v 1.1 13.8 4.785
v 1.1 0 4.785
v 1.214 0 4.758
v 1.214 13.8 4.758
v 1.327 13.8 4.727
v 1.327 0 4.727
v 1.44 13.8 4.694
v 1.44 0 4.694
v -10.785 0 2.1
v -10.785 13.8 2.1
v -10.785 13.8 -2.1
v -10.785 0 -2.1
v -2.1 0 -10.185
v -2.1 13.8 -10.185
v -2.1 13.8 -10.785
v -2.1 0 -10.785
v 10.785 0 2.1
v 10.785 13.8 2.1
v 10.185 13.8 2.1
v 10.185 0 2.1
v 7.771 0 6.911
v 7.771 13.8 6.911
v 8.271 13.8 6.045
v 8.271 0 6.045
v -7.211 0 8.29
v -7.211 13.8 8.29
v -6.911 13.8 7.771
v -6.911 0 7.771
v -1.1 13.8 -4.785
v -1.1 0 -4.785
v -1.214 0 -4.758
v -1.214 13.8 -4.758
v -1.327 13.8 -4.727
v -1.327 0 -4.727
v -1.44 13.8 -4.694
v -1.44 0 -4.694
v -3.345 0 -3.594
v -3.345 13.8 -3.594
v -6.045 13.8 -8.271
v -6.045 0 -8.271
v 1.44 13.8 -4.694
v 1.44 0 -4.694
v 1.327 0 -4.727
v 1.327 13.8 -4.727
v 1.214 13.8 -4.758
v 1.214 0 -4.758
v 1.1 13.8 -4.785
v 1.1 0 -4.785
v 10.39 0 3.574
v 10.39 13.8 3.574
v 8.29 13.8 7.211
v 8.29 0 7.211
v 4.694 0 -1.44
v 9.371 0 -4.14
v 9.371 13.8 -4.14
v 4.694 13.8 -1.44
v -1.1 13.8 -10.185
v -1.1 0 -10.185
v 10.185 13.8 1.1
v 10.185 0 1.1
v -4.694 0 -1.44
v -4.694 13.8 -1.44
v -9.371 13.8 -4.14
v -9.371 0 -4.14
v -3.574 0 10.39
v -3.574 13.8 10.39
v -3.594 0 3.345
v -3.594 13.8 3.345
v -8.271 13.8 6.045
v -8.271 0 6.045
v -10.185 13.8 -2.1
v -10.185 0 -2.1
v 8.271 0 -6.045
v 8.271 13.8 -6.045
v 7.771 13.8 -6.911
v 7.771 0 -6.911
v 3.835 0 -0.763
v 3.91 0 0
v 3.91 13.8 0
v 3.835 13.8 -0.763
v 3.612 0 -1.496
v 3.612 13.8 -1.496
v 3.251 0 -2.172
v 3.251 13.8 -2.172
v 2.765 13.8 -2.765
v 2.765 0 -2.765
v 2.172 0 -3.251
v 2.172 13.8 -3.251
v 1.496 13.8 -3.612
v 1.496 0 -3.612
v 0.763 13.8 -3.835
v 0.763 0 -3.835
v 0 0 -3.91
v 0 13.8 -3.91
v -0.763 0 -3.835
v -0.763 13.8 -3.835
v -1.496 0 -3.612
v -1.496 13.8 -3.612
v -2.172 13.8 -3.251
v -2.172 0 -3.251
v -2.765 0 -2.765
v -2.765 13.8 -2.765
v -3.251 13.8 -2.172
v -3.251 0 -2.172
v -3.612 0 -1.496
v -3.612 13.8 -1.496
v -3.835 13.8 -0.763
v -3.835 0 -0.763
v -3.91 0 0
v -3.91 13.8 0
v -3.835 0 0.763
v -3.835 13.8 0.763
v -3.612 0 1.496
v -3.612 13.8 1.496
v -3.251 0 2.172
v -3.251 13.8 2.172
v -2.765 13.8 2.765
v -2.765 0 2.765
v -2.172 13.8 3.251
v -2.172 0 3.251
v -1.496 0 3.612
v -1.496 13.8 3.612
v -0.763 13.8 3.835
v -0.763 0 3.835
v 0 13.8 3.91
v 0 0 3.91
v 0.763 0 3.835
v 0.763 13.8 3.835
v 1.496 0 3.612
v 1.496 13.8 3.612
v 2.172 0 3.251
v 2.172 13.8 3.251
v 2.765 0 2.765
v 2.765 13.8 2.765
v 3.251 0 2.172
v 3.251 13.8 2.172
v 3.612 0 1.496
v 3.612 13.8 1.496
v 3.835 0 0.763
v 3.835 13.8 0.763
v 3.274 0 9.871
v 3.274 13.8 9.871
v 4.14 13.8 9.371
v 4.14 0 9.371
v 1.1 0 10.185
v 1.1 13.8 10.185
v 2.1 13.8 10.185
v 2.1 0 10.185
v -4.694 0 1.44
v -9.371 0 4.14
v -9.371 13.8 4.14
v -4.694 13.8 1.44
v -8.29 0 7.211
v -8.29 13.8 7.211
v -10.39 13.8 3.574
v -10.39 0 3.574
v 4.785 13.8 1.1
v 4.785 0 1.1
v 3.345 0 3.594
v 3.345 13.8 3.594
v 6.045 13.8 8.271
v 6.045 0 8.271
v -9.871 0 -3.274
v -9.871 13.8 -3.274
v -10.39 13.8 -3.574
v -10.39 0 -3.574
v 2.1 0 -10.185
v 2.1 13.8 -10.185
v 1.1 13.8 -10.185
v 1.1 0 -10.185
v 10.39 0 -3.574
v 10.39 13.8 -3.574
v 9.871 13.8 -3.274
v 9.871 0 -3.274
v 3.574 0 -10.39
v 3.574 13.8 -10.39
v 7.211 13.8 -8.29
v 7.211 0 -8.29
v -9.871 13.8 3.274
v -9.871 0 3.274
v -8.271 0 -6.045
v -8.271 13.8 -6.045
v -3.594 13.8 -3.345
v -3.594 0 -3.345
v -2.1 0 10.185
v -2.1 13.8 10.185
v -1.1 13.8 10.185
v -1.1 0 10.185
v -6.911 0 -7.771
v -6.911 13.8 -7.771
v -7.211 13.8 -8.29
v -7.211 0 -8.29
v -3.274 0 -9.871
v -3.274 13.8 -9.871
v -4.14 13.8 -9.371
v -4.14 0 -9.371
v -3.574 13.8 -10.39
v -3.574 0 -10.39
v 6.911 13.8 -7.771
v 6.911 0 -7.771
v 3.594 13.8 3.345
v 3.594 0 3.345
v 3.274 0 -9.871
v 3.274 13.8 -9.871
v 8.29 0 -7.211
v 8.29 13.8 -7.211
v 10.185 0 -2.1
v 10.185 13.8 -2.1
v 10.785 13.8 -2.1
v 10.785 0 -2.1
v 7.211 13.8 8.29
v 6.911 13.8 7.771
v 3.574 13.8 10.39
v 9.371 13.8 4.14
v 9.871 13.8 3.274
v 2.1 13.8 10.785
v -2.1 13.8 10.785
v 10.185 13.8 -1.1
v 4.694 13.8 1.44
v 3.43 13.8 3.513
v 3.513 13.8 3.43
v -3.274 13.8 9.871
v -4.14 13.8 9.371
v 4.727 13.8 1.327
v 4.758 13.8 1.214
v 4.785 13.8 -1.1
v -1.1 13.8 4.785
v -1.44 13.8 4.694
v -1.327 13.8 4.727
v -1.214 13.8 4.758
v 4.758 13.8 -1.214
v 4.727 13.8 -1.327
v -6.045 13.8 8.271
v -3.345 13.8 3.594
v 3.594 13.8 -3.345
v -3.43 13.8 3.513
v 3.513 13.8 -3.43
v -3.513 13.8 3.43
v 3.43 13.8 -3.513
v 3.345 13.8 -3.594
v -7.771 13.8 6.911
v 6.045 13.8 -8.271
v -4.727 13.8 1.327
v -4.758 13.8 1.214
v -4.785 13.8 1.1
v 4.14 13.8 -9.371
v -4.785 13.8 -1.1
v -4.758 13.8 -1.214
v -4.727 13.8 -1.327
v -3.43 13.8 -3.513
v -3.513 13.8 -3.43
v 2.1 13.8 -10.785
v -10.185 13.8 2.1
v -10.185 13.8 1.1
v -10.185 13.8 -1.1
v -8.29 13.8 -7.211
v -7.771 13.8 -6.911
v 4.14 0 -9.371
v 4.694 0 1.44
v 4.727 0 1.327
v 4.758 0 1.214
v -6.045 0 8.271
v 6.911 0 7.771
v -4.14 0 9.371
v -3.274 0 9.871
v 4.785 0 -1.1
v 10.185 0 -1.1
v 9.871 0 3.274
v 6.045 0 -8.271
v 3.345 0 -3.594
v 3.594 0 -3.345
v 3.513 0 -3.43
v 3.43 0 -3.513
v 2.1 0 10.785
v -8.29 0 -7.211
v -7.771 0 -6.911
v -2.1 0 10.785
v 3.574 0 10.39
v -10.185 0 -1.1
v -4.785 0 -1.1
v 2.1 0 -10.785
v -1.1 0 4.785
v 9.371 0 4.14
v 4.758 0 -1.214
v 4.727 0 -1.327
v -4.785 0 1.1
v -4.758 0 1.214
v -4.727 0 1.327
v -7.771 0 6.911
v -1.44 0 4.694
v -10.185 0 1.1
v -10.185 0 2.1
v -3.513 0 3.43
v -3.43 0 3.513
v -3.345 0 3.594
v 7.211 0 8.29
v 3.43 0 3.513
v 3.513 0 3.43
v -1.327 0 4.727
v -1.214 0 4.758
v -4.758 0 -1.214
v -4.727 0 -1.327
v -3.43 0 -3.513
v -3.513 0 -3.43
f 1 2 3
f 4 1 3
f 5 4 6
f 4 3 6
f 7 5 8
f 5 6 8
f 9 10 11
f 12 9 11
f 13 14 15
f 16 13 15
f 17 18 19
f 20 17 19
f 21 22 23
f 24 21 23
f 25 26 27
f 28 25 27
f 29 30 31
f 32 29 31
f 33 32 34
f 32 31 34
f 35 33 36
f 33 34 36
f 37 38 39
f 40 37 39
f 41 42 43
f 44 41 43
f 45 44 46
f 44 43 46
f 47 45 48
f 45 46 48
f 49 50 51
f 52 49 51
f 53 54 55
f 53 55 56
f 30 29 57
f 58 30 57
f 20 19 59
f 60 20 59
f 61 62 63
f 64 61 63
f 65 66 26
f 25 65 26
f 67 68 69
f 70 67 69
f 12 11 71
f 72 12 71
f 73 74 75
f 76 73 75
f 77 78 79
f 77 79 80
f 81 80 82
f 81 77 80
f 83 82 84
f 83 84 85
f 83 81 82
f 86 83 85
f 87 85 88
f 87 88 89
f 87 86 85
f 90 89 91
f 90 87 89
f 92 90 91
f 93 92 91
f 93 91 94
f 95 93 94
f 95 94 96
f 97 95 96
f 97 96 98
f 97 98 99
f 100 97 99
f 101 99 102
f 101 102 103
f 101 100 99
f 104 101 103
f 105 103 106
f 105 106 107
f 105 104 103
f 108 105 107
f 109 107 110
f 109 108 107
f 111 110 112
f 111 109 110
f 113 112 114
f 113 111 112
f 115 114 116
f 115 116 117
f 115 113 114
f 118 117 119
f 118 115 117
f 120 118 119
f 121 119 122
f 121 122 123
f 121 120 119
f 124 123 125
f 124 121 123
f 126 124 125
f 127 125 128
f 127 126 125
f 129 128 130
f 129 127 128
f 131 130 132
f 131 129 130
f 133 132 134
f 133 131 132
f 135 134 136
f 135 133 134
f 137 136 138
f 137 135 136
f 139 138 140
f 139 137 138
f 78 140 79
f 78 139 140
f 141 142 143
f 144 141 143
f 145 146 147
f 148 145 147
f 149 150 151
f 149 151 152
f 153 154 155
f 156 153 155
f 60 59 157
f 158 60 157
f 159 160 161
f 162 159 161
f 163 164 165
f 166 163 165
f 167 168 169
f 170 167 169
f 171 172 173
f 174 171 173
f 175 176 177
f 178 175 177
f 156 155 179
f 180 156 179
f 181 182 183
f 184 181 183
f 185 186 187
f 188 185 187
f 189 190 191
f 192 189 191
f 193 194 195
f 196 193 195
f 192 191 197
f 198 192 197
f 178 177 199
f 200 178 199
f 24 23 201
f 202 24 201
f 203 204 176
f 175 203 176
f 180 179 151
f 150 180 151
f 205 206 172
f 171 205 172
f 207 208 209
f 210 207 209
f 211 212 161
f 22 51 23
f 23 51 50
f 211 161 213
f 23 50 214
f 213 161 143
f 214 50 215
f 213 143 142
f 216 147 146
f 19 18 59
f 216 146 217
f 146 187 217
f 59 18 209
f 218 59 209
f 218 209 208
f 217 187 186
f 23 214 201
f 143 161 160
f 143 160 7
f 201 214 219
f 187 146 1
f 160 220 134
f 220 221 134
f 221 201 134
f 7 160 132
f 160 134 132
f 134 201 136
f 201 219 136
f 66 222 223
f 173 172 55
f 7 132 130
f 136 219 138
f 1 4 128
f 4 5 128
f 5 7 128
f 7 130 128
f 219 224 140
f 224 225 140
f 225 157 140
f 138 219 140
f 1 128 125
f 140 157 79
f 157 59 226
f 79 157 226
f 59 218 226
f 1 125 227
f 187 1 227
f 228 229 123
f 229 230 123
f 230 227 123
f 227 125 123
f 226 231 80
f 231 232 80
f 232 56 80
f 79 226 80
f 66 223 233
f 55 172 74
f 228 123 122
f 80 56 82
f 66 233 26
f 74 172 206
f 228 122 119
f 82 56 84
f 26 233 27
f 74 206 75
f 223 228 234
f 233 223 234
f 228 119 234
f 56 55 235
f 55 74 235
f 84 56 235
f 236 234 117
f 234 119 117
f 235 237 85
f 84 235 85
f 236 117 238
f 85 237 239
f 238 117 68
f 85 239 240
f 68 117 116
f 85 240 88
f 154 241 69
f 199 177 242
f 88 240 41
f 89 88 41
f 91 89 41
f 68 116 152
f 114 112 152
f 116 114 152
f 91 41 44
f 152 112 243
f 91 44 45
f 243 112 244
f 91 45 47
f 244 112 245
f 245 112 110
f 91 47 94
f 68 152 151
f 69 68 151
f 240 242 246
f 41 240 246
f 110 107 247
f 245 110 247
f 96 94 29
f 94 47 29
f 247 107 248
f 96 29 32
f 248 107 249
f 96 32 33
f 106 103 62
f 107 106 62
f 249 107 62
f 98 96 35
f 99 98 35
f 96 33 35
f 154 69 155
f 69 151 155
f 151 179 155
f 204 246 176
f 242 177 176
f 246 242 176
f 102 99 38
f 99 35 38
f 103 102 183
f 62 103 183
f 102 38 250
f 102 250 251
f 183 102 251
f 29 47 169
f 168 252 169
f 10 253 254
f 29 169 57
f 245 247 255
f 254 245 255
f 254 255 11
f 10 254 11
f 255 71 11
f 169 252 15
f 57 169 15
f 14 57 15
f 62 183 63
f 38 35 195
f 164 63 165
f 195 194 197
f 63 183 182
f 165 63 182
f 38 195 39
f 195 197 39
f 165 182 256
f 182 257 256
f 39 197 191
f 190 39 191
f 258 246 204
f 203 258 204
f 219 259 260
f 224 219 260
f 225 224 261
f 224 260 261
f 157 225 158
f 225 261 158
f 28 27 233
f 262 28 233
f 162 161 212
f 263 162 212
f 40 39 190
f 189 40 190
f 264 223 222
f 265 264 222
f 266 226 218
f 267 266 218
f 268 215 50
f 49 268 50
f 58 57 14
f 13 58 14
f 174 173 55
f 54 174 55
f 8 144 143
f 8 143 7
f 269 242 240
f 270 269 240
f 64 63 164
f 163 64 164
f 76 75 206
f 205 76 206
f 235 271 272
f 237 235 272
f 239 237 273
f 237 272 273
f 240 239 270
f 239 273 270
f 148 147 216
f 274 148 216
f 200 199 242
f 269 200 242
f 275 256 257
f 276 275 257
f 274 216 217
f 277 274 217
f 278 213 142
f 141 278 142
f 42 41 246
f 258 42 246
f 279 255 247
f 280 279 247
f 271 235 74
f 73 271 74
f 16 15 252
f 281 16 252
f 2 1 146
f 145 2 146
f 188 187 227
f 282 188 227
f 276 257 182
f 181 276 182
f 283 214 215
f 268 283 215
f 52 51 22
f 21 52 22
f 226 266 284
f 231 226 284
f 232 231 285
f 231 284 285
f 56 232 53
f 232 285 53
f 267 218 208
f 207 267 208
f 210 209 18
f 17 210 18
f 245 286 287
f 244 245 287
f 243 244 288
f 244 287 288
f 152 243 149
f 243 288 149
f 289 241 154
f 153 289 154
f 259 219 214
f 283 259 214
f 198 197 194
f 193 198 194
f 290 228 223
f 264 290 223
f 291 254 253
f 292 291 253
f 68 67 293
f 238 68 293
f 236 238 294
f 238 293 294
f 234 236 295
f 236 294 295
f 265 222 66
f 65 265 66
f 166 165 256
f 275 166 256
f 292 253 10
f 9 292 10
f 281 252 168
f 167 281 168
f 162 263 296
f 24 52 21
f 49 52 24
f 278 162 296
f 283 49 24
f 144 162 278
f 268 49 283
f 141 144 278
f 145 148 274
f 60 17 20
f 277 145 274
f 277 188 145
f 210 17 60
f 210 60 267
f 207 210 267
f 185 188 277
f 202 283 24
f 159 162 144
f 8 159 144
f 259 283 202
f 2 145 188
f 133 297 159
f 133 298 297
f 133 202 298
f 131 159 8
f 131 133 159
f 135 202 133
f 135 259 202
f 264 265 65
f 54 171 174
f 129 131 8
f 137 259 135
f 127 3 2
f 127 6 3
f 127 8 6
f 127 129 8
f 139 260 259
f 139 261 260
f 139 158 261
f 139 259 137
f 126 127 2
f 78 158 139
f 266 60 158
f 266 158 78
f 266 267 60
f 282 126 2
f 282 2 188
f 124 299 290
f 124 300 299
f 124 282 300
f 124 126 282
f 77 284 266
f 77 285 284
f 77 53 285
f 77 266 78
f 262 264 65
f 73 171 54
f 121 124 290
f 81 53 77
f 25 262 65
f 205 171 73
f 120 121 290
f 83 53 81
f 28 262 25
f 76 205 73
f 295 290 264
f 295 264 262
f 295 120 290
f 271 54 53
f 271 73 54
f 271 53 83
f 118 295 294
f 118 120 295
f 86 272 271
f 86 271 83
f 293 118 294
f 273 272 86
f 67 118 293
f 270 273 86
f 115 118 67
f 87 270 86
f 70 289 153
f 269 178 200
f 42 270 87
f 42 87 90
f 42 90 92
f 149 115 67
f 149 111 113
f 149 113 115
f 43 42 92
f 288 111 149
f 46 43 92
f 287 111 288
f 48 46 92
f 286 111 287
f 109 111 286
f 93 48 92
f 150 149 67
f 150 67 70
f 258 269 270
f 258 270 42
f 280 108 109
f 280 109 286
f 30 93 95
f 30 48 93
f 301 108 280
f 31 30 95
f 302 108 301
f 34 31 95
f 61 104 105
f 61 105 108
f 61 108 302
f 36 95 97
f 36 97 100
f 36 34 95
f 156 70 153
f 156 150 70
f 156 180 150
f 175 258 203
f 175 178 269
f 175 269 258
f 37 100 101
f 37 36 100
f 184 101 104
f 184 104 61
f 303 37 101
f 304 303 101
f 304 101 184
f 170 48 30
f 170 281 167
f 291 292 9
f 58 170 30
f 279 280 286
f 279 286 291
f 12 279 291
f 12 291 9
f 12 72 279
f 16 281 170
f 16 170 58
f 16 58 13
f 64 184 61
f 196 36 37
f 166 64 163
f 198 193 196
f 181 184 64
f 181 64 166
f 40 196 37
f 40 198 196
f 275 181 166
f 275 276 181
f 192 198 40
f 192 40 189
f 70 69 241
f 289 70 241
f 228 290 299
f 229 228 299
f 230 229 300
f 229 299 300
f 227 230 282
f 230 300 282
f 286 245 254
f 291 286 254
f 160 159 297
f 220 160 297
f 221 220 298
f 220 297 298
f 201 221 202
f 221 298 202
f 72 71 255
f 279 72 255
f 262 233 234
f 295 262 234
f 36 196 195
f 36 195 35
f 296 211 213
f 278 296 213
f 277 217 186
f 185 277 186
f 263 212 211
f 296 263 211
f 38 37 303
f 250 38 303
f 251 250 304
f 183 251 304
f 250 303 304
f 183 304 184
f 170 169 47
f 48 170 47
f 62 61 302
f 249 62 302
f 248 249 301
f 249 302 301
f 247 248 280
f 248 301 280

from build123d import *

# Parameters (mm, degrees)
SKETCH2_R           = 4.91
SKETCH2_R_2         = 3.91
BOSS_EXTRUDE1_DEPTH = 13.8
BOSS_EXTRUDE2_DEPTH = 13.8


with BuildPart() as part:
    # Sketch2 → Boss-Extrude1 (new body)
    with BuildSketch(Plane(origin=(0, 0, 0), x_dir=(1, 0, 0), z_dir=(0, 1, 0))):
        Circle(SKETCH2_R)
        Circle(SKETCH2_R_2, mode=Mode.SUBTRACT)
    extrude(amount=BOSS_EXTRUDE1_DEPTH)

    # Sketch3 → Boss-Extrude2 (add)
    with BuildSketch(Plane(origin=(0, 13.8, 0), x_dir=(1, 0, 0), z_dir=(0, 1, 0))):
        with BuildLine():
            Line((4.785195921, 1.1), (10.185195921, 1.1))
            Line((10.185195921, 1.1), (10.185195921, 2.1))
            Line((10.185195921, 2.1), (10.785195921, 2.1))
            Line((10.785195921, 2.1), (10.785195921, -2.1))
            Line((10.785195921, -2.1), (10.185195921, -2.1))
            Line((10.185195921, -2.1), (10.185195921, -1.1))
            Line((10.185195921, -1.1), (4.785195921, -1.1))
            ThreePointArc((4.785195921, -1.1), (4.91, 0), (4.785195921, 1.1))
        make_face()
        with BuildLine():
            Line((4.694101229, -1.439970016), (9.37063841, -4.139970016))
            Line((9.37063841, -4.139970016), (9.87063841, -3.273944612))
            Line((9.87063841, -3.273944612), (10.390253652, -3.573944612))
            Line((10.390253652, -3.573944612), (8.290253652, -7.211251308))
            Line((8.290253652, -7.211251308), (7.77063841, -6.911251308))
            Line((7.77063841, -6.911251308), (8.27063841, -6.045225905))
            Line((8.27063841, -6.045225905), (3.594101229, -3.345225905))
            ThreePointArc((3.594101229, -3.345225905), (4.252184733, -2.455), (4.694101229, -1.439970016))
        make_face()
        with BuildLine():
            Line((3.345225905, -3.594101229), (6.045225905, -8.27063841))
            Line((6.045225905, -8.27063841), (6.911251308, -7.77063841))
            Line((6.911251308, -7.77063841), (7.211251308, -8.290253652))
            Line((7.211251308, -8.290253652), (3.573944612, -10.390253652))
            Line((3.573944612, -10.390253652), (3.273944612, -9.87063841))
            Line((3.273944612, -9.87063841), (4.139970016, -9.37063841))
            Line((4.139970016, -9.37063841), (1.439970016, -4.694101229))
            ThreePointArc((1.439970016, -4.694101229), (2.455, -4.252184733), (3.345225905, -3.594101229))
        make_face()
        with BuildLine():
            Line((1.1, -4.785195921), (1.1, -10.185195921))
            Line((1.1, -10.185195921), (2.1, -10.185195921))
            Line((2.1, -10.185195921), (2.1, -10.785195921))
            Line((2.1, -10.785195921), (-2.1, -10.785195921))
            Line((-2.1, -10.785195921), (-2.1, -10.185195921))
            Line((-2.1, -10.185195921), (-1.1, -10.185195921))
            Line((-1.1, -10.185195921), (-1.1, -4.785195921))
            ThreePointArc((-1.1, -4.785195921), (0, -4.91), (1.1, -4.785195921))
        make_face()
        with BuildLine():
            Line((-1.439970016, -4.694101229), (-4.139970016, -9.37063841))
            Line((-4.139970016, -9.37063841), (-3.273944612, -9.87063841))
            Line((-3.273944612, -9.87063841), (-3.573944612, -10.390253652))
            Line((-3.573944612, -10.390253652), (-7.211251308, -8.290253652))
            Line((-7.211251308, -8.290253652), (-6.911251308, -7.77063841))
            Line((-6.911251308, -7.77063841), (-6.045225905, -8.27063841))
            Line((-6.045225905, -8.27063841), (-3.345225905, -3.594101229))
            ThreePointArc((-3.345225905, -3.594101229), (-2.455, -4.252184733), (-1.439970016, -4.694101229))
        make_face()
        with BuildLine():
            Line((-3.594101229, -3.345225905), (-8.27063841, -6.045225905))
            Line((-8.27063841, -6.045225905), (-7.77063841, -6.911251308))
            Line((-7.77063841, -6.911251308), (-8.290253652, -7.211251308))
            Line((-8.290253652, -7.211251308), (-10.390253652, -3.573944612))
            Line((-10.390253652, -3.573944612), (-9.87063841, -3.273944612))
            Line((-9.87063841, -3.273944612), (-9.37063841, -4.139970016))
            Line((-9.37063841, -4.139970016), (-4.694101229, -1.439970016))
            ThreePointArc((-4.694101229, -1.439970016), (-4.252184733, -2.455), (-3.594101229, -3.345225905))
        make_face()
        with BuildLine():
            Line((-4.785195921, -1.1), (-10.185195921, -1.1))
            Line((-10.185195921, -1.1), (-10.185195921, -2.1))
            Line((-10.185195921, -2.1), (-10.785195921, -2.1))
            Line((-10.785195921, -2.1), (-10.785195921, 2.1))
            Line((-10.785195921, 2.1), (-10.185195921, 2.1))
            Line((-10.185195921, 2.1), (-10.185195921, 1.1))
            Line((-10.185195921, 1.1), (-4.785195921, 1.1))
            ThreePointArc((-4.785195921, 1.1), (-4.91, 0), (-4.785195921, -1.1))
        make_face()
        with BuildLine():
            Line((-4.694101229, 1.439970016), (-9.37063841, 4.139970016))
            Line((-9.37063841, 4.139970016), (-9.87063841, 3.273944612))
            Line((-9.87063841, 3.273944612), (-10.390253652, 3.573944612))
            Line((-10.390253652, 3.573944612), (-8.290253652, 7.211251308))
            Line((-8.290253652, 7.211251308), (-7.77063841, 6.911251308))
            Line((-7.77063841, 6.911251308), (-8.27063841, 6.045225905))
            Line((-8.27063841, 6.045225905), (-3.594101229, 3.345225905))
            ThreePointArc((-3.594101229, 3.345225905), (-4.252184733, 2.455), (-4.694101229, 1.439970016))
        make_face()
        with BuildLine():
            Line((-3.345225905, 3.594101229), (-6.045225905, 8.27063841))
            Line((-6.045225905, 8.27063841), (-6.911251308, 7.77063841))
            Line((-6.911251308, 7.77063841), (-7.211251308, 8.290253652))
            Line((-7.211251308, 8.290253652), (-3.573944612, 10.390253652))
            Line((-3.573944612, 10.390253652), (-3.273944612, 9.87063841))
            Line((-3.273944612, 9.87063841), (-4.139970016, 9.37063841))
            Line((-4.139970016, 9.37063841), (-1.439970016, 4.694101229))
            ThreePointArc((-1.439970016, 4.694101229), (-2.455, 4.252184733), (-3.345225905, 3.594101229))
        make_face()
        with BuildLine():
            Line((-1.1, 4.785195921), (-1.1, 10.185195921))
            Line((-1.1, 10.185195921), (-2.1, 10.185195921))
            Line((-2.1, 10.185195921), (-2.1, 10.785195921))
            Line((-2.1, 10.785195921), (2.1, 10.785195921))
            Line((2.1, 10.785195921), (2.1, 10.185195921))
            Line((2.1, 10.185195921), (1.1, 10.185195921))
            Line((1.1, 10.185195921), (1.1, 4.785195921))
            ThreePointArc((1.1, 4.785195921), (0, 4.91), (-1.1, 4.785195921))
        make_face()
        with BuildLine():
            Line((1.439970016, 4.694101229), (4.139970016, 9.37063841))
            Line((4.139970016, 9.37063841), (3.273944612, 9.87063841))
            Line((3.273944612, 9.87063841), (3.573944612, 10.390253652))
            Line((3.573944612, 10.390253652), (7.211251308, 8.290253652))
            Line((7.211251308, 8.290253652), (6.911251308, 7.77063841))
            Line((6.911251308, 7.77063841), (6.045225905, 8.27063841))
            Line((6.045225905, 8.27063841), (3.345225905, 3.594101229))
            ThreePointArc((3.345225905, 3.594101229), (2.455, 4.252184733), (1.439970016, 4.694101229))
        make_face()
        with BuildLine():
            Line((3.594101229, 3.345225905), (8.27063841, 6.045225905))
            Line((8.27063841, 6.045225905), (7.77063841, 6.911251308))
            Line((7.77063841, 6.911251308), (8.290253652, 7.211251308))
            Line((8.290253652, 7.211251308), (10.390253652, 3.573944612))
            Line((10.390253652, 3.573944612), (9.87063841, 3.273944612))
            Line((9.87063841, 3.273944612), (9.37063841, 4.139970016))
            Line((9.37063841, 4.139970016), (4.694101229, 1.439970016))
            ThreePointArc((4.694101229, 1.439970016), (4.252184733, 2.455), (3.594101229, 3.345225905))
        make_face()
    extrude(amount=-BOSS_EXTRUDE2_DEPTH)


solid = part.part
